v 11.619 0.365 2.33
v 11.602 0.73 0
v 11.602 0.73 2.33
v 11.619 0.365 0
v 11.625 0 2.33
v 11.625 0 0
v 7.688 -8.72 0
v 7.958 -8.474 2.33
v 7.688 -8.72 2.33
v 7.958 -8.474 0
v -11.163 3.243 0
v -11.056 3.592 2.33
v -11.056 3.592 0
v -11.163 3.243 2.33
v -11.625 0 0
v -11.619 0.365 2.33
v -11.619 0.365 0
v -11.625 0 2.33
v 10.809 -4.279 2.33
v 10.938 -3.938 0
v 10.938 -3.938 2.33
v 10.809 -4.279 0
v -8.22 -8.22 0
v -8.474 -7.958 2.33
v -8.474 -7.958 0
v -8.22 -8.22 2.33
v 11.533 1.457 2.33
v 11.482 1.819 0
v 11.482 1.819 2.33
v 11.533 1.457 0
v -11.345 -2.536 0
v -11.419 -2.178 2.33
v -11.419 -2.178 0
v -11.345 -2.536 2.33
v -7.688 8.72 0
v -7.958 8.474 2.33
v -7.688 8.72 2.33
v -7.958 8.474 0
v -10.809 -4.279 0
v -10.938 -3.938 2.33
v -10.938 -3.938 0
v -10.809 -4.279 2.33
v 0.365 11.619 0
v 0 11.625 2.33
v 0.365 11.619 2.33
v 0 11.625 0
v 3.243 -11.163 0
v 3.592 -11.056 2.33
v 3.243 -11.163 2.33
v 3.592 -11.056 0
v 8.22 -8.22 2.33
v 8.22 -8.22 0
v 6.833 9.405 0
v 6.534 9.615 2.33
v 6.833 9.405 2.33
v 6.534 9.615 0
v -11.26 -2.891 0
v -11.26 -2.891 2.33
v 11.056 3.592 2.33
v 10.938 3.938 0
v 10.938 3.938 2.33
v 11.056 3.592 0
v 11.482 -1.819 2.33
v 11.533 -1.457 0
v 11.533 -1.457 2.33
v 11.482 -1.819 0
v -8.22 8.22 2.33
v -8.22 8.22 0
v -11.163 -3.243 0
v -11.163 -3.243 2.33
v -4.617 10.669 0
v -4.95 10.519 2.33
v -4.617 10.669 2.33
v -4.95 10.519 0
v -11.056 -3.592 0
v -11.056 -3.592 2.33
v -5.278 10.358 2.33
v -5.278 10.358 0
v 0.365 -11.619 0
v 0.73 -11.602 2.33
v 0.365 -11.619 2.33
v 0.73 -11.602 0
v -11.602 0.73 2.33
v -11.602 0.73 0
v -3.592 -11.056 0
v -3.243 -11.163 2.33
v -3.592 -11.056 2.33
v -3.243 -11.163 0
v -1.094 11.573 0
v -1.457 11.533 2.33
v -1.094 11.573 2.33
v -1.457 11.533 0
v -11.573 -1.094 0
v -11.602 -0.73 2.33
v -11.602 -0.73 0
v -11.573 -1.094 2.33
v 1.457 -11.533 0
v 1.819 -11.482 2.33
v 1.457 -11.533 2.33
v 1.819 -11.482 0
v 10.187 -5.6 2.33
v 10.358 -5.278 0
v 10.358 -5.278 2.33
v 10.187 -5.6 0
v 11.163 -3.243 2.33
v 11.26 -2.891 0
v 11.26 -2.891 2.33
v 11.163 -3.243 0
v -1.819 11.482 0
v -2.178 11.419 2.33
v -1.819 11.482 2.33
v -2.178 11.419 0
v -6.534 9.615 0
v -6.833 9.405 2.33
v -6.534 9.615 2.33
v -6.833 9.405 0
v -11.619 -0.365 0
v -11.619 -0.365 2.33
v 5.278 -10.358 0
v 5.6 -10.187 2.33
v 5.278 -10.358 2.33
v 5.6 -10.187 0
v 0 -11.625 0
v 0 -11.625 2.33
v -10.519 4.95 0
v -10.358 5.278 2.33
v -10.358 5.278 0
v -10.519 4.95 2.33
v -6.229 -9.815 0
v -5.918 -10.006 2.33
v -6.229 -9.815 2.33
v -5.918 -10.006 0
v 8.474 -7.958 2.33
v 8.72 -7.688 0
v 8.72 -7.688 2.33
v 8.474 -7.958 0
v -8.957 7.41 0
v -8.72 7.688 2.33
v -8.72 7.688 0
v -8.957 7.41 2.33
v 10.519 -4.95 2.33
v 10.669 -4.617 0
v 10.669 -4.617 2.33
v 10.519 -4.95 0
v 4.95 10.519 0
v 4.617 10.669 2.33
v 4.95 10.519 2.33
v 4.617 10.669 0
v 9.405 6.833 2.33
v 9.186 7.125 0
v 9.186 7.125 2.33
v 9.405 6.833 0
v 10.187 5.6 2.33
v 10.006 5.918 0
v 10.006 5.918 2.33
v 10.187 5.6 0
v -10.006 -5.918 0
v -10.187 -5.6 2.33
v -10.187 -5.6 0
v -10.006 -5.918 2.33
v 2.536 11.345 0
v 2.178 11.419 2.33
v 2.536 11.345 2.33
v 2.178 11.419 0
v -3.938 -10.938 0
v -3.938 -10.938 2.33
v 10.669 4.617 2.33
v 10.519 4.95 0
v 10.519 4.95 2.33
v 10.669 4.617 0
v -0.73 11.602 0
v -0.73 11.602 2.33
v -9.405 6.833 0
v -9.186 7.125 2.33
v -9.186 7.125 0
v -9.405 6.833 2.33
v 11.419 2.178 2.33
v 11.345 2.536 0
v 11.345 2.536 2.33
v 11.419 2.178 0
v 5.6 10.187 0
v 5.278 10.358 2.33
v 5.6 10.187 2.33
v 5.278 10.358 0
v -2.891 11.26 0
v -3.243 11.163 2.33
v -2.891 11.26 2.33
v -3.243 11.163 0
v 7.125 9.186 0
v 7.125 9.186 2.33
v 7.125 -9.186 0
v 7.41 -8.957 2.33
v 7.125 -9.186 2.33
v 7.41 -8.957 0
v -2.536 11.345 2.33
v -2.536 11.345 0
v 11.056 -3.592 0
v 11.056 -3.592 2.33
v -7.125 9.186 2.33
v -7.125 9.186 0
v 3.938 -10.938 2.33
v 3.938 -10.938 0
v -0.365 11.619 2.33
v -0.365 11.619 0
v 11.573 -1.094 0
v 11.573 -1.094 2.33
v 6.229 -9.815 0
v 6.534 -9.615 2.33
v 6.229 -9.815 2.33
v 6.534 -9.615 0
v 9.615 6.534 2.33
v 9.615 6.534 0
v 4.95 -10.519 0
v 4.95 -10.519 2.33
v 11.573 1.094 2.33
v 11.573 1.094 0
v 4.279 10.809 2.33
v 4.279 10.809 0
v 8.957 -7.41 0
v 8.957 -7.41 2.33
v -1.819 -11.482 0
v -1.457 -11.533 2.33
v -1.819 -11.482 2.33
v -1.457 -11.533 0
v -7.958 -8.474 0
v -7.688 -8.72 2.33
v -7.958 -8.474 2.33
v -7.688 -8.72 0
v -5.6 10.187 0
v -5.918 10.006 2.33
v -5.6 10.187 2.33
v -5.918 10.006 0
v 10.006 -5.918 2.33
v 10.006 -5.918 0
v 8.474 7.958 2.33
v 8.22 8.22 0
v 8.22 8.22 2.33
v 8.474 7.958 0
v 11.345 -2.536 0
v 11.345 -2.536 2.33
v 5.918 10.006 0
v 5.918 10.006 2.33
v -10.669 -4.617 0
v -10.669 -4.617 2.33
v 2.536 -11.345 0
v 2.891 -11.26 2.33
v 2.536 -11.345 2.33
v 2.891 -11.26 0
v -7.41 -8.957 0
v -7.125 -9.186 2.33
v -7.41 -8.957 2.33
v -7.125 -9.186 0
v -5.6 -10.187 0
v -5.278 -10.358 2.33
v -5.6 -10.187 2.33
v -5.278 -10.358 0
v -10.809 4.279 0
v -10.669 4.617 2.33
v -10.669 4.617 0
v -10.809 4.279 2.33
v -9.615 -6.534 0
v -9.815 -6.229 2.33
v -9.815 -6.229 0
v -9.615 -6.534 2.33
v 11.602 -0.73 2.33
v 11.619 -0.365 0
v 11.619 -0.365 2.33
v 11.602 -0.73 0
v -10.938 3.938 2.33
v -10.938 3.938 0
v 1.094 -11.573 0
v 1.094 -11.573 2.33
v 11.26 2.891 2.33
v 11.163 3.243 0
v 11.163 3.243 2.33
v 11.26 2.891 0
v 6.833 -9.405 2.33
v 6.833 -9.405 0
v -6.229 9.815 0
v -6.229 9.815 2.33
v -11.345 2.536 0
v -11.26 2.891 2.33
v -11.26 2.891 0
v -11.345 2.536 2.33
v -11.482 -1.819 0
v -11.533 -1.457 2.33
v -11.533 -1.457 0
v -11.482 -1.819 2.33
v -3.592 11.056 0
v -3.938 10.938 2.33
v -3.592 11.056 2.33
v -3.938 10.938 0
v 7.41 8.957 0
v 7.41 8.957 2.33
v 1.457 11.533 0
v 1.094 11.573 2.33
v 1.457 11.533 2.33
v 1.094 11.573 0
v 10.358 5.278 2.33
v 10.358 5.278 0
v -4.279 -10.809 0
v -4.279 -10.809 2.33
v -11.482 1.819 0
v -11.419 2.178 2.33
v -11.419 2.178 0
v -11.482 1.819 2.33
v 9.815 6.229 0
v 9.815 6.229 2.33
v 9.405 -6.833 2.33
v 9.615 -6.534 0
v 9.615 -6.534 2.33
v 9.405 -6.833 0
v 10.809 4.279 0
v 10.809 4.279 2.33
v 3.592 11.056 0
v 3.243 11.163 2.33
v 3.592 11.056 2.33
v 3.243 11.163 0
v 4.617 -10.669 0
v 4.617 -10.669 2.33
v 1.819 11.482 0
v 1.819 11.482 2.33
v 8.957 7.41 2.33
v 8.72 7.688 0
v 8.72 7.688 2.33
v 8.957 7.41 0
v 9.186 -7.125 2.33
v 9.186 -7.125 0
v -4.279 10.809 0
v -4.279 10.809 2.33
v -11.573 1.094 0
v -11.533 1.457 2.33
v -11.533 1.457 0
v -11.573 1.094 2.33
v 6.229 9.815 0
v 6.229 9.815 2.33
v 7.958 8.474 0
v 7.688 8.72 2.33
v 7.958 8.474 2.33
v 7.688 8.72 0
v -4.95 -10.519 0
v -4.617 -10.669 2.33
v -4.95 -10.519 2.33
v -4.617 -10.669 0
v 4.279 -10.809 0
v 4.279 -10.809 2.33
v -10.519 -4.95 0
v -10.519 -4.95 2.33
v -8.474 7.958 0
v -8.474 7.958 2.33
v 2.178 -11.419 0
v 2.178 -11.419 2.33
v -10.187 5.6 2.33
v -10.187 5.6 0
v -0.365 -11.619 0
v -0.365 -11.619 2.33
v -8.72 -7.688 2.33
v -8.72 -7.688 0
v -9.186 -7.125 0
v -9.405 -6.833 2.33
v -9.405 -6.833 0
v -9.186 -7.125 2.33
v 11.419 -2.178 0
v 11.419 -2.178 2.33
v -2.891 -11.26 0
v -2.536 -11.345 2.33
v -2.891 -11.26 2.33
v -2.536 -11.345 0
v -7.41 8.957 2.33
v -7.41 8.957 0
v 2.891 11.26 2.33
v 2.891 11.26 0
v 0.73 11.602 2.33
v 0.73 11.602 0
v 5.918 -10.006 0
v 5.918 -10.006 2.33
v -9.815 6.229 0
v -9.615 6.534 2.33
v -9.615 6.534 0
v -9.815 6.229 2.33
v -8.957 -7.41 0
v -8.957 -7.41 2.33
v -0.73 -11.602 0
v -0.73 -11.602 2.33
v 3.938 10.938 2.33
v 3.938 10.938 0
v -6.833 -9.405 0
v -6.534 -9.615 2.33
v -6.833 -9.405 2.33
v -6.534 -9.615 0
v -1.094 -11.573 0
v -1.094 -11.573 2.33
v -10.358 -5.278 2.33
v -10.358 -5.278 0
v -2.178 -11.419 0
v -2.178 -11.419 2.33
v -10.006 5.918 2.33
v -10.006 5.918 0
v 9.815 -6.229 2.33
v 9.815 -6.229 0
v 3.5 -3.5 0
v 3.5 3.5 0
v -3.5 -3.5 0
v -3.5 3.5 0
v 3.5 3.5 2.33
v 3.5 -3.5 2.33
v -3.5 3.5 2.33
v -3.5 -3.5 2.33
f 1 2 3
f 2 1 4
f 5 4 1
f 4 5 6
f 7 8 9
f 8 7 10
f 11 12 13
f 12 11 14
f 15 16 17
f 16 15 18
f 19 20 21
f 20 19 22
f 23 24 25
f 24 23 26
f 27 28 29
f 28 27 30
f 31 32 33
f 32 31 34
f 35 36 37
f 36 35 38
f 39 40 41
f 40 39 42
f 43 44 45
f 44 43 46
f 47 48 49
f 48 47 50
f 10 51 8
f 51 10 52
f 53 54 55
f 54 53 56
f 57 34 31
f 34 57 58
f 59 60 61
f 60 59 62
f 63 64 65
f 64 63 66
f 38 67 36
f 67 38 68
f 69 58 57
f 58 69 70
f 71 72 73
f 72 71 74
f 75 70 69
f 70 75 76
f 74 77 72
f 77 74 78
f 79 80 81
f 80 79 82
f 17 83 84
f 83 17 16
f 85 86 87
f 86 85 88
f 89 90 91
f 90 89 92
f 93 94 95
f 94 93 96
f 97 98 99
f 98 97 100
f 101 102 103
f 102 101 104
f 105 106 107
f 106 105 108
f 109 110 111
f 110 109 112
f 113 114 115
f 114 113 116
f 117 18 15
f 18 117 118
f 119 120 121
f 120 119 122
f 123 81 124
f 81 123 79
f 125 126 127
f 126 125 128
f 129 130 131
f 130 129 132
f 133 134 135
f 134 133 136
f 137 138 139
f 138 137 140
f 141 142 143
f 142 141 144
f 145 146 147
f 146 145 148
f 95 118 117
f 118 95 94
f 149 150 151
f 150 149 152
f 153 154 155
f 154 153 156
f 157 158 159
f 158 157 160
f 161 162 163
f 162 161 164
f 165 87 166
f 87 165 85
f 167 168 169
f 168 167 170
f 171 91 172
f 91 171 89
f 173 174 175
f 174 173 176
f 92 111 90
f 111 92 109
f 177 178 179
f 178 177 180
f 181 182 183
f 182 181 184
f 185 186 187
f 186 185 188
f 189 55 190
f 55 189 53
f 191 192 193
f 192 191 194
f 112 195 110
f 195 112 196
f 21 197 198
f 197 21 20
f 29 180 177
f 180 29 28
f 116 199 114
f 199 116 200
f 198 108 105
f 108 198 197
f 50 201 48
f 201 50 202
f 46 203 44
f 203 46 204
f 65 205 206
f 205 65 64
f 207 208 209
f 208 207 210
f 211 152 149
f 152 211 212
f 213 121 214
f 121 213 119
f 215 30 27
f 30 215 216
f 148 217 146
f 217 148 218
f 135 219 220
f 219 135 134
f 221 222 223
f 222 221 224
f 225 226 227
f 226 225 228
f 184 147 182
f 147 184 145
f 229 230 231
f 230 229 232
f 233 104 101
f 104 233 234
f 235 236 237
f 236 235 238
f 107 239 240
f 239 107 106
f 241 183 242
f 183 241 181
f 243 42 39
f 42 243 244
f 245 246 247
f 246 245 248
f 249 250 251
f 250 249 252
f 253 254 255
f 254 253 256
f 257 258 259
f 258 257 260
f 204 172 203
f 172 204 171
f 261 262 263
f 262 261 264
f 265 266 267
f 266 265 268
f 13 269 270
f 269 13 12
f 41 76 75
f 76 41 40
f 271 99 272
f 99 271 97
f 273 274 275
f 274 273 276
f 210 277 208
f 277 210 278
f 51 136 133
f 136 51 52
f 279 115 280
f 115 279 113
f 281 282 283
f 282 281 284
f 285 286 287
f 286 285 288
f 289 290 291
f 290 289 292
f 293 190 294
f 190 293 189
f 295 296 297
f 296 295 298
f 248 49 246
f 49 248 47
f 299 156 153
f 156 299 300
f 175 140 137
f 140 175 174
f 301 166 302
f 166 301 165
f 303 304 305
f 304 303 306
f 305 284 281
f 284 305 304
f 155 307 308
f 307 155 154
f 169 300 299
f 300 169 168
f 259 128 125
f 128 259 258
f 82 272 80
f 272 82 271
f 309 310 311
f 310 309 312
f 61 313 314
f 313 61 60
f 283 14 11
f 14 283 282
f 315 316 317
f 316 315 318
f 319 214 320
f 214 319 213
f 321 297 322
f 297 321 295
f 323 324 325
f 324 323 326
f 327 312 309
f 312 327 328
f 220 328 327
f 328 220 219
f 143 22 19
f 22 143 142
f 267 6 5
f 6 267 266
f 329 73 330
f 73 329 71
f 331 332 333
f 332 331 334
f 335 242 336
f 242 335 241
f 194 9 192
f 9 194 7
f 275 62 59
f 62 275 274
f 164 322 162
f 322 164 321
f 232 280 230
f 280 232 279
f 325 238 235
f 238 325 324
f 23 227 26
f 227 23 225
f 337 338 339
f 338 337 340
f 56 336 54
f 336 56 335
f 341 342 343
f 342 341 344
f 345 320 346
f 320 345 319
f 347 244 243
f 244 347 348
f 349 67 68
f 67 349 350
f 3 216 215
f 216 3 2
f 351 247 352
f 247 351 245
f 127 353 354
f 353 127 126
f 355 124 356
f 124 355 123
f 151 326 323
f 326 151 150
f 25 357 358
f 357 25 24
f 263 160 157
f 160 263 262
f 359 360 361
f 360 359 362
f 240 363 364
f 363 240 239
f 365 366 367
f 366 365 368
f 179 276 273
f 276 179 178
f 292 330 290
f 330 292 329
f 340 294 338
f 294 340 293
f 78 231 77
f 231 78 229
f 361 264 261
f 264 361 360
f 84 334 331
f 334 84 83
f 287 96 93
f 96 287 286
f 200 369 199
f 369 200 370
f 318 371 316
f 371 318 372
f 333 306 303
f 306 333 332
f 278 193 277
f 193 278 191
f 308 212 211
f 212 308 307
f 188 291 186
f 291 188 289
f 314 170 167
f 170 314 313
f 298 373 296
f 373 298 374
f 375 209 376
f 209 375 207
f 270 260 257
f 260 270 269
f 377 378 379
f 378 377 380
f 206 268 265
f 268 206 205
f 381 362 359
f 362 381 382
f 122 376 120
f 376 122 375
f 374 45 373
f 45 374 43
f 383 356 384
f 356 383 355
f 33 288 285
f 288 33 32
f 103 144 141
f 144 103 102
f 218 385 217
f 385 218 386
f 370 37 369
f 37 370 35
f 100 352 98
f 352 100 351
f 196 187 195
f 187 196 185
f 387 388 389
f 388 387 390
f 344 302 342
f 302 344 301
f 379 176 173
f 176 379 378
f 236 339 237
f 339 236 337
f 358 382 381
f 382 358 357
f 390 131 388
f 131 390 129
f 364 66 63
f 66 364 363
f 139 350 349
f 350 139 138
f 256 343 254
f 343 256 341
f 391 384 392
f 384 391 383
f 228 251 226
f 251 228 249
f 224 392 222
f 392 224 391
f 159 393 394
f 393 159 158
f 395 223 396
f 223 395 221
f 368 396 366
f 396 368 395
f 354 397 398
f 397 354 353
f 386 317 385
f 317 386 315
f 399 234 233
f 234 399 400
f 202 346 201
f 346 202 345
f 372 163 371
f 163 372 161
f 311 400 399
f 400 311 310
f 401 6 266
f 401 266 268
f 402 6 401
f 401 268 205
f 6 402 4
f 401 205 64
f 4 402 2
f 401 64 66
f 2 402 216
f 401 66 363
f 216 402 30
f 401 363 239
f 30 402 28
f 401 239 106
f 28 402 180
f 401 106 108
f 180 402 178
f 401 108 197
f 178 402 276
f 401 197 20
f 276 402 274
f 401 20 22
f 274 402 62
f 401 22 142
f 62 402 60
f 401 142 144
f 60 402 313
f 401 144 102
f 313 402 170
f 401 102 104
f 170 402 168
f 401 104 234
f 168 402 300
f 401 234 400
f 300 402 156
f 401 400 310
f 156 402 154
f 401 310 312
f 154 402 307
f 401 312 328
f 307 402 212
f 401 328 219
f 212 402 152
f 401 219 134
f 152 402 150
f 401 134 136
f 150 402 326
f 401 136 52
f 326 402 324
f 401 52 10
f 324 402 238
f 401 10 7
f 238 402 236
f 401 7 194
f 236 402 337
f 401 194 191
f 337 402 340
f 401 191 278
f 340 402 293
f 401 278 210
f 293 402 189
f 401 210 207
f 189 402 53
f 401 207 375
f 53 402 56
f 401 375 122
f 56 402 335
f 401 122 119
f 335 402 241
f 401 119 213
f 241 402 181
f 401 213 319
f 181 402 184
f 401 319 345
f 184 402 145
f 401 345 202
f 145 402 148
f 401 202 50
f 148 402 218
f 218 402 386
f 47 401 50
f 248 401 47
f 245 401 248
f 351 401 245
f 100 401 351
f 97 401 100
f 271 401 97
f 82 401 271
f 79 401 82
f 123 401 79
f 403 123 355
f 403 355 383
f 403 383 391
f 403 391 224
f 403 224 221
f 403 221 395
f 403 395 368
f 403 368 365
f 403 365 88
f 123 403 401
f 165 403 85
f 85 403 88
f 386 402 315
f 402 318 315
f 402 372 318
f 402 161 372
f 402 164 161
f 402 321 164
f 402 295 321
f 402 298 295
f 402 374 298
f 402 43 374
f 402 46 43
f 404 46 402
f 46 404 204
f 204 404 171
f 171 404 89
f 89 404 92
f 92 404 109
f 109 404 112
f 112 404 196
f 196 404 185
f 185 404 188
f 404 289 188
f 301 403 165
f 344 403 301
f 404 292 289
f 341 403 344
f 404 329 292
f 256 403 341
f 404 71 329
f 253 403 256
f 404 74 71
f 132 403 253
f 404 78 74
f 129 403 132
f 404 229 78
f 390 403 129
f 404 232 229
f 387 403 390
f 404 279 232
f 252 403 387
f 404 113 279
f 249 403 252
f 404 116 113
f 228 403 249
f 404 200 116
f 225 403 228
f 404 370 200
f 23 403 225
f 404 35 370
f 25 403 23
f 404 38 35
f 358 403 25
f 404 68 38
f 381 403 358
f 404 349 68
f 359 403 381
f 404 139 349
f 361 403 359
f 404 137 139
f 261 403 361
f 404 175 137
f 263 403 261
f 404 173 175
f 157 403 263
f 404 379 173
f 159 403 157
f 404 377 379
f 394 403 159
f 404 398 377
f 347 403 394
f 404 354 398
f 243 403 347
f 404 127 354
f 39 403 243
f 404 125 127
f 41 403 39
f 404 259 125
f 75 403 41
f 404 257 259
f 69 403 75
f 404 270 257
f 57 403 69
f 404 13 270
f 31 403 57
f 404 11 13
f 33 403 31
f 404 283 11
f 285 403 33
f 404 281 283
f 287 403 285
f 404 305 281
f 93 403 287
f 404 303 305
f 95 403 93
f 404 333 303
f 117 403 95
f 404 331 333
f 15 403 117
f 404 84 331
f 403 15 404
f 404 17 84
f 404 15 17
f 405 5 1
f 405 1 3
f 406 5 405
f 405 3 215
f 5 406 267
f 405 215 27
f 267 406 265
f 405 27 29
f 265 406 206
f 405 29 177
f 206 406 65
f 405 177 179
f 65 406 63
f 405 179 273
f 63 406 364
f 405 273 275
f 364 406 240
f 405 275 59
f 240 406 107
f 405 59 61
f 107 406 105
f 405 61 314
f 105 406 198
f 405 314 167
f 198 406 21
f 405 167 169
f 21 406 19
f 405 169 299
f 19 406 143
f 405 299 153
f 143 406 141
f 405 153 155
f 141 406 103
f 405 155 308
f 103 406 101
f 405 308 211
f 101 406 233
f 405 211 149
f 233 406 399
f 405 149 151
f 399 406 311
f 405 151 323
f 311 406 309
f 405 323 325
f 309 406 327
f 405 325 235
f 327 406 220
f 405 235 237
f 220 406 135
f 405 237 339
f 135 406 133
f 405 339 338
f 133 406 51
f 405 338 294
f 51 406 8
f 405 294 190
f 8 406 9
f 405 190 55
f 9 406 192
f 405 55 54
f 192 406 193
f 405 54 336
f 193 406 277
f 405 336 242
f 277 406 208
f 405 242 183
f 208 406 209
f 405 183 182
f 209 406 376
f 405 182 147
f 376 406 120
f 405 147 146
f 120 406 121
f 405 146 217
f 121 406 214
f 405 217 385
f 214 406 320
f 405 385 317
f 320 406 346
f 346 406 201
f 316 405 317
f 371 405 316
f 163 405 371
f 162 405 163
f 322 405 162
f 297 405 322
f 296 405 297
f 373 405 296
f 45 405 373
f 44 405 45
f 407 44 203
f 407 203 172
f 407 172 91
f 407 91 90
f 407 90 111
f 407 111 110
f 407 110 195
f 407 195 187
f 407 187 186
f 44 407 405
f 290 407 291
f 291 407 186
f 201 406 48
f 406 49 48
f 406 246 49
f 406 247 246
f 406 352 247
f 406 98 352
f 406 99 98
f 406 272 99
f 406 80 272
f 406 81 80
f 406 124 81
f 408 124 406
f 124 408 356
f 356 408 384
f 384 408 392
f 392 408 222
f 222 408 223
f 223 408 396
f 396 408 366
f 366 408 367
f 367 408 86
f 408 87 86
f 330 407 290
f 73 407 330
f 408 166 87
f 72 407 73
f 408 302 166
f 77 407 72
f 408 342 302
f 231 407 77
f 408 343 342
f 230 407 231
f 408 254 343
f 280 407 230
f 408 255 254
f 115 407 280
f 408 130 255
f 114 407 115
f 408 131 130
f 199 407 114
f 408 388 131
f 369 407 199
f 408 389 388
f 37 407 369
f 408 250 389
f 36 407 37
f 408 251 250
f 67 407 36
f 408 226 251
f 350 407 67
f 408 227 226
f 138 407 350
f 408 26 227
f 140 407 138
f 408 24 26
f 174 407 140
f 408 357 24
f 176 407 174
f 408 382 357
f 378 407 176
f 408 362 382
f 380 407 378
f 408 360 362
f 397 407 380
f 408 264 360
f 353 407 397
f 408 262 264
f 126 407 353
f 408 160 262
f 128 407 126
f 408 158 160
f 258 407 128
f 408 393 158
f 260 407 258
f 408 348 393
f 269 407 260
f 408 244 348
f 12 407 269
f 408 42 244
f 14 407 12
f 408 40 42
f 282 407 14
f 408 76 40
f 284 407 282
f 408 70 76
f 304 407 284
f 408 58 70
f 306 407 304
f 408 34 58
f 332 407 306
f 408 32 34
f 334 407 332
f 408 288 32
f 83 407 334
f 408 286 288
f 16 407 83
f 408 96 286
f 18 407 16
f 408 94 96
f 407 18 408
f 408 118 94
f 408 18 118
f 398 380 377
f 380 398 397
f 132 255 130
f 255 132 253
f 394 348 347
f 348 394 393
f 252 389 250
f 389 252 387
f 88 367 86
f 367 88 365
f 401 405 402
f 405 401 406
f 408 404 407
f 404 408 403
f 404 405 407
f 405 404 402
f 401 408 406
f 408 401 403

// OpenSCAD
$fn=200;

difference()
{
    cylinder(d=23.25, h=2.33);
    translate([-3.5,-3.5,-3])
    {
        cube(7);
    }
}
